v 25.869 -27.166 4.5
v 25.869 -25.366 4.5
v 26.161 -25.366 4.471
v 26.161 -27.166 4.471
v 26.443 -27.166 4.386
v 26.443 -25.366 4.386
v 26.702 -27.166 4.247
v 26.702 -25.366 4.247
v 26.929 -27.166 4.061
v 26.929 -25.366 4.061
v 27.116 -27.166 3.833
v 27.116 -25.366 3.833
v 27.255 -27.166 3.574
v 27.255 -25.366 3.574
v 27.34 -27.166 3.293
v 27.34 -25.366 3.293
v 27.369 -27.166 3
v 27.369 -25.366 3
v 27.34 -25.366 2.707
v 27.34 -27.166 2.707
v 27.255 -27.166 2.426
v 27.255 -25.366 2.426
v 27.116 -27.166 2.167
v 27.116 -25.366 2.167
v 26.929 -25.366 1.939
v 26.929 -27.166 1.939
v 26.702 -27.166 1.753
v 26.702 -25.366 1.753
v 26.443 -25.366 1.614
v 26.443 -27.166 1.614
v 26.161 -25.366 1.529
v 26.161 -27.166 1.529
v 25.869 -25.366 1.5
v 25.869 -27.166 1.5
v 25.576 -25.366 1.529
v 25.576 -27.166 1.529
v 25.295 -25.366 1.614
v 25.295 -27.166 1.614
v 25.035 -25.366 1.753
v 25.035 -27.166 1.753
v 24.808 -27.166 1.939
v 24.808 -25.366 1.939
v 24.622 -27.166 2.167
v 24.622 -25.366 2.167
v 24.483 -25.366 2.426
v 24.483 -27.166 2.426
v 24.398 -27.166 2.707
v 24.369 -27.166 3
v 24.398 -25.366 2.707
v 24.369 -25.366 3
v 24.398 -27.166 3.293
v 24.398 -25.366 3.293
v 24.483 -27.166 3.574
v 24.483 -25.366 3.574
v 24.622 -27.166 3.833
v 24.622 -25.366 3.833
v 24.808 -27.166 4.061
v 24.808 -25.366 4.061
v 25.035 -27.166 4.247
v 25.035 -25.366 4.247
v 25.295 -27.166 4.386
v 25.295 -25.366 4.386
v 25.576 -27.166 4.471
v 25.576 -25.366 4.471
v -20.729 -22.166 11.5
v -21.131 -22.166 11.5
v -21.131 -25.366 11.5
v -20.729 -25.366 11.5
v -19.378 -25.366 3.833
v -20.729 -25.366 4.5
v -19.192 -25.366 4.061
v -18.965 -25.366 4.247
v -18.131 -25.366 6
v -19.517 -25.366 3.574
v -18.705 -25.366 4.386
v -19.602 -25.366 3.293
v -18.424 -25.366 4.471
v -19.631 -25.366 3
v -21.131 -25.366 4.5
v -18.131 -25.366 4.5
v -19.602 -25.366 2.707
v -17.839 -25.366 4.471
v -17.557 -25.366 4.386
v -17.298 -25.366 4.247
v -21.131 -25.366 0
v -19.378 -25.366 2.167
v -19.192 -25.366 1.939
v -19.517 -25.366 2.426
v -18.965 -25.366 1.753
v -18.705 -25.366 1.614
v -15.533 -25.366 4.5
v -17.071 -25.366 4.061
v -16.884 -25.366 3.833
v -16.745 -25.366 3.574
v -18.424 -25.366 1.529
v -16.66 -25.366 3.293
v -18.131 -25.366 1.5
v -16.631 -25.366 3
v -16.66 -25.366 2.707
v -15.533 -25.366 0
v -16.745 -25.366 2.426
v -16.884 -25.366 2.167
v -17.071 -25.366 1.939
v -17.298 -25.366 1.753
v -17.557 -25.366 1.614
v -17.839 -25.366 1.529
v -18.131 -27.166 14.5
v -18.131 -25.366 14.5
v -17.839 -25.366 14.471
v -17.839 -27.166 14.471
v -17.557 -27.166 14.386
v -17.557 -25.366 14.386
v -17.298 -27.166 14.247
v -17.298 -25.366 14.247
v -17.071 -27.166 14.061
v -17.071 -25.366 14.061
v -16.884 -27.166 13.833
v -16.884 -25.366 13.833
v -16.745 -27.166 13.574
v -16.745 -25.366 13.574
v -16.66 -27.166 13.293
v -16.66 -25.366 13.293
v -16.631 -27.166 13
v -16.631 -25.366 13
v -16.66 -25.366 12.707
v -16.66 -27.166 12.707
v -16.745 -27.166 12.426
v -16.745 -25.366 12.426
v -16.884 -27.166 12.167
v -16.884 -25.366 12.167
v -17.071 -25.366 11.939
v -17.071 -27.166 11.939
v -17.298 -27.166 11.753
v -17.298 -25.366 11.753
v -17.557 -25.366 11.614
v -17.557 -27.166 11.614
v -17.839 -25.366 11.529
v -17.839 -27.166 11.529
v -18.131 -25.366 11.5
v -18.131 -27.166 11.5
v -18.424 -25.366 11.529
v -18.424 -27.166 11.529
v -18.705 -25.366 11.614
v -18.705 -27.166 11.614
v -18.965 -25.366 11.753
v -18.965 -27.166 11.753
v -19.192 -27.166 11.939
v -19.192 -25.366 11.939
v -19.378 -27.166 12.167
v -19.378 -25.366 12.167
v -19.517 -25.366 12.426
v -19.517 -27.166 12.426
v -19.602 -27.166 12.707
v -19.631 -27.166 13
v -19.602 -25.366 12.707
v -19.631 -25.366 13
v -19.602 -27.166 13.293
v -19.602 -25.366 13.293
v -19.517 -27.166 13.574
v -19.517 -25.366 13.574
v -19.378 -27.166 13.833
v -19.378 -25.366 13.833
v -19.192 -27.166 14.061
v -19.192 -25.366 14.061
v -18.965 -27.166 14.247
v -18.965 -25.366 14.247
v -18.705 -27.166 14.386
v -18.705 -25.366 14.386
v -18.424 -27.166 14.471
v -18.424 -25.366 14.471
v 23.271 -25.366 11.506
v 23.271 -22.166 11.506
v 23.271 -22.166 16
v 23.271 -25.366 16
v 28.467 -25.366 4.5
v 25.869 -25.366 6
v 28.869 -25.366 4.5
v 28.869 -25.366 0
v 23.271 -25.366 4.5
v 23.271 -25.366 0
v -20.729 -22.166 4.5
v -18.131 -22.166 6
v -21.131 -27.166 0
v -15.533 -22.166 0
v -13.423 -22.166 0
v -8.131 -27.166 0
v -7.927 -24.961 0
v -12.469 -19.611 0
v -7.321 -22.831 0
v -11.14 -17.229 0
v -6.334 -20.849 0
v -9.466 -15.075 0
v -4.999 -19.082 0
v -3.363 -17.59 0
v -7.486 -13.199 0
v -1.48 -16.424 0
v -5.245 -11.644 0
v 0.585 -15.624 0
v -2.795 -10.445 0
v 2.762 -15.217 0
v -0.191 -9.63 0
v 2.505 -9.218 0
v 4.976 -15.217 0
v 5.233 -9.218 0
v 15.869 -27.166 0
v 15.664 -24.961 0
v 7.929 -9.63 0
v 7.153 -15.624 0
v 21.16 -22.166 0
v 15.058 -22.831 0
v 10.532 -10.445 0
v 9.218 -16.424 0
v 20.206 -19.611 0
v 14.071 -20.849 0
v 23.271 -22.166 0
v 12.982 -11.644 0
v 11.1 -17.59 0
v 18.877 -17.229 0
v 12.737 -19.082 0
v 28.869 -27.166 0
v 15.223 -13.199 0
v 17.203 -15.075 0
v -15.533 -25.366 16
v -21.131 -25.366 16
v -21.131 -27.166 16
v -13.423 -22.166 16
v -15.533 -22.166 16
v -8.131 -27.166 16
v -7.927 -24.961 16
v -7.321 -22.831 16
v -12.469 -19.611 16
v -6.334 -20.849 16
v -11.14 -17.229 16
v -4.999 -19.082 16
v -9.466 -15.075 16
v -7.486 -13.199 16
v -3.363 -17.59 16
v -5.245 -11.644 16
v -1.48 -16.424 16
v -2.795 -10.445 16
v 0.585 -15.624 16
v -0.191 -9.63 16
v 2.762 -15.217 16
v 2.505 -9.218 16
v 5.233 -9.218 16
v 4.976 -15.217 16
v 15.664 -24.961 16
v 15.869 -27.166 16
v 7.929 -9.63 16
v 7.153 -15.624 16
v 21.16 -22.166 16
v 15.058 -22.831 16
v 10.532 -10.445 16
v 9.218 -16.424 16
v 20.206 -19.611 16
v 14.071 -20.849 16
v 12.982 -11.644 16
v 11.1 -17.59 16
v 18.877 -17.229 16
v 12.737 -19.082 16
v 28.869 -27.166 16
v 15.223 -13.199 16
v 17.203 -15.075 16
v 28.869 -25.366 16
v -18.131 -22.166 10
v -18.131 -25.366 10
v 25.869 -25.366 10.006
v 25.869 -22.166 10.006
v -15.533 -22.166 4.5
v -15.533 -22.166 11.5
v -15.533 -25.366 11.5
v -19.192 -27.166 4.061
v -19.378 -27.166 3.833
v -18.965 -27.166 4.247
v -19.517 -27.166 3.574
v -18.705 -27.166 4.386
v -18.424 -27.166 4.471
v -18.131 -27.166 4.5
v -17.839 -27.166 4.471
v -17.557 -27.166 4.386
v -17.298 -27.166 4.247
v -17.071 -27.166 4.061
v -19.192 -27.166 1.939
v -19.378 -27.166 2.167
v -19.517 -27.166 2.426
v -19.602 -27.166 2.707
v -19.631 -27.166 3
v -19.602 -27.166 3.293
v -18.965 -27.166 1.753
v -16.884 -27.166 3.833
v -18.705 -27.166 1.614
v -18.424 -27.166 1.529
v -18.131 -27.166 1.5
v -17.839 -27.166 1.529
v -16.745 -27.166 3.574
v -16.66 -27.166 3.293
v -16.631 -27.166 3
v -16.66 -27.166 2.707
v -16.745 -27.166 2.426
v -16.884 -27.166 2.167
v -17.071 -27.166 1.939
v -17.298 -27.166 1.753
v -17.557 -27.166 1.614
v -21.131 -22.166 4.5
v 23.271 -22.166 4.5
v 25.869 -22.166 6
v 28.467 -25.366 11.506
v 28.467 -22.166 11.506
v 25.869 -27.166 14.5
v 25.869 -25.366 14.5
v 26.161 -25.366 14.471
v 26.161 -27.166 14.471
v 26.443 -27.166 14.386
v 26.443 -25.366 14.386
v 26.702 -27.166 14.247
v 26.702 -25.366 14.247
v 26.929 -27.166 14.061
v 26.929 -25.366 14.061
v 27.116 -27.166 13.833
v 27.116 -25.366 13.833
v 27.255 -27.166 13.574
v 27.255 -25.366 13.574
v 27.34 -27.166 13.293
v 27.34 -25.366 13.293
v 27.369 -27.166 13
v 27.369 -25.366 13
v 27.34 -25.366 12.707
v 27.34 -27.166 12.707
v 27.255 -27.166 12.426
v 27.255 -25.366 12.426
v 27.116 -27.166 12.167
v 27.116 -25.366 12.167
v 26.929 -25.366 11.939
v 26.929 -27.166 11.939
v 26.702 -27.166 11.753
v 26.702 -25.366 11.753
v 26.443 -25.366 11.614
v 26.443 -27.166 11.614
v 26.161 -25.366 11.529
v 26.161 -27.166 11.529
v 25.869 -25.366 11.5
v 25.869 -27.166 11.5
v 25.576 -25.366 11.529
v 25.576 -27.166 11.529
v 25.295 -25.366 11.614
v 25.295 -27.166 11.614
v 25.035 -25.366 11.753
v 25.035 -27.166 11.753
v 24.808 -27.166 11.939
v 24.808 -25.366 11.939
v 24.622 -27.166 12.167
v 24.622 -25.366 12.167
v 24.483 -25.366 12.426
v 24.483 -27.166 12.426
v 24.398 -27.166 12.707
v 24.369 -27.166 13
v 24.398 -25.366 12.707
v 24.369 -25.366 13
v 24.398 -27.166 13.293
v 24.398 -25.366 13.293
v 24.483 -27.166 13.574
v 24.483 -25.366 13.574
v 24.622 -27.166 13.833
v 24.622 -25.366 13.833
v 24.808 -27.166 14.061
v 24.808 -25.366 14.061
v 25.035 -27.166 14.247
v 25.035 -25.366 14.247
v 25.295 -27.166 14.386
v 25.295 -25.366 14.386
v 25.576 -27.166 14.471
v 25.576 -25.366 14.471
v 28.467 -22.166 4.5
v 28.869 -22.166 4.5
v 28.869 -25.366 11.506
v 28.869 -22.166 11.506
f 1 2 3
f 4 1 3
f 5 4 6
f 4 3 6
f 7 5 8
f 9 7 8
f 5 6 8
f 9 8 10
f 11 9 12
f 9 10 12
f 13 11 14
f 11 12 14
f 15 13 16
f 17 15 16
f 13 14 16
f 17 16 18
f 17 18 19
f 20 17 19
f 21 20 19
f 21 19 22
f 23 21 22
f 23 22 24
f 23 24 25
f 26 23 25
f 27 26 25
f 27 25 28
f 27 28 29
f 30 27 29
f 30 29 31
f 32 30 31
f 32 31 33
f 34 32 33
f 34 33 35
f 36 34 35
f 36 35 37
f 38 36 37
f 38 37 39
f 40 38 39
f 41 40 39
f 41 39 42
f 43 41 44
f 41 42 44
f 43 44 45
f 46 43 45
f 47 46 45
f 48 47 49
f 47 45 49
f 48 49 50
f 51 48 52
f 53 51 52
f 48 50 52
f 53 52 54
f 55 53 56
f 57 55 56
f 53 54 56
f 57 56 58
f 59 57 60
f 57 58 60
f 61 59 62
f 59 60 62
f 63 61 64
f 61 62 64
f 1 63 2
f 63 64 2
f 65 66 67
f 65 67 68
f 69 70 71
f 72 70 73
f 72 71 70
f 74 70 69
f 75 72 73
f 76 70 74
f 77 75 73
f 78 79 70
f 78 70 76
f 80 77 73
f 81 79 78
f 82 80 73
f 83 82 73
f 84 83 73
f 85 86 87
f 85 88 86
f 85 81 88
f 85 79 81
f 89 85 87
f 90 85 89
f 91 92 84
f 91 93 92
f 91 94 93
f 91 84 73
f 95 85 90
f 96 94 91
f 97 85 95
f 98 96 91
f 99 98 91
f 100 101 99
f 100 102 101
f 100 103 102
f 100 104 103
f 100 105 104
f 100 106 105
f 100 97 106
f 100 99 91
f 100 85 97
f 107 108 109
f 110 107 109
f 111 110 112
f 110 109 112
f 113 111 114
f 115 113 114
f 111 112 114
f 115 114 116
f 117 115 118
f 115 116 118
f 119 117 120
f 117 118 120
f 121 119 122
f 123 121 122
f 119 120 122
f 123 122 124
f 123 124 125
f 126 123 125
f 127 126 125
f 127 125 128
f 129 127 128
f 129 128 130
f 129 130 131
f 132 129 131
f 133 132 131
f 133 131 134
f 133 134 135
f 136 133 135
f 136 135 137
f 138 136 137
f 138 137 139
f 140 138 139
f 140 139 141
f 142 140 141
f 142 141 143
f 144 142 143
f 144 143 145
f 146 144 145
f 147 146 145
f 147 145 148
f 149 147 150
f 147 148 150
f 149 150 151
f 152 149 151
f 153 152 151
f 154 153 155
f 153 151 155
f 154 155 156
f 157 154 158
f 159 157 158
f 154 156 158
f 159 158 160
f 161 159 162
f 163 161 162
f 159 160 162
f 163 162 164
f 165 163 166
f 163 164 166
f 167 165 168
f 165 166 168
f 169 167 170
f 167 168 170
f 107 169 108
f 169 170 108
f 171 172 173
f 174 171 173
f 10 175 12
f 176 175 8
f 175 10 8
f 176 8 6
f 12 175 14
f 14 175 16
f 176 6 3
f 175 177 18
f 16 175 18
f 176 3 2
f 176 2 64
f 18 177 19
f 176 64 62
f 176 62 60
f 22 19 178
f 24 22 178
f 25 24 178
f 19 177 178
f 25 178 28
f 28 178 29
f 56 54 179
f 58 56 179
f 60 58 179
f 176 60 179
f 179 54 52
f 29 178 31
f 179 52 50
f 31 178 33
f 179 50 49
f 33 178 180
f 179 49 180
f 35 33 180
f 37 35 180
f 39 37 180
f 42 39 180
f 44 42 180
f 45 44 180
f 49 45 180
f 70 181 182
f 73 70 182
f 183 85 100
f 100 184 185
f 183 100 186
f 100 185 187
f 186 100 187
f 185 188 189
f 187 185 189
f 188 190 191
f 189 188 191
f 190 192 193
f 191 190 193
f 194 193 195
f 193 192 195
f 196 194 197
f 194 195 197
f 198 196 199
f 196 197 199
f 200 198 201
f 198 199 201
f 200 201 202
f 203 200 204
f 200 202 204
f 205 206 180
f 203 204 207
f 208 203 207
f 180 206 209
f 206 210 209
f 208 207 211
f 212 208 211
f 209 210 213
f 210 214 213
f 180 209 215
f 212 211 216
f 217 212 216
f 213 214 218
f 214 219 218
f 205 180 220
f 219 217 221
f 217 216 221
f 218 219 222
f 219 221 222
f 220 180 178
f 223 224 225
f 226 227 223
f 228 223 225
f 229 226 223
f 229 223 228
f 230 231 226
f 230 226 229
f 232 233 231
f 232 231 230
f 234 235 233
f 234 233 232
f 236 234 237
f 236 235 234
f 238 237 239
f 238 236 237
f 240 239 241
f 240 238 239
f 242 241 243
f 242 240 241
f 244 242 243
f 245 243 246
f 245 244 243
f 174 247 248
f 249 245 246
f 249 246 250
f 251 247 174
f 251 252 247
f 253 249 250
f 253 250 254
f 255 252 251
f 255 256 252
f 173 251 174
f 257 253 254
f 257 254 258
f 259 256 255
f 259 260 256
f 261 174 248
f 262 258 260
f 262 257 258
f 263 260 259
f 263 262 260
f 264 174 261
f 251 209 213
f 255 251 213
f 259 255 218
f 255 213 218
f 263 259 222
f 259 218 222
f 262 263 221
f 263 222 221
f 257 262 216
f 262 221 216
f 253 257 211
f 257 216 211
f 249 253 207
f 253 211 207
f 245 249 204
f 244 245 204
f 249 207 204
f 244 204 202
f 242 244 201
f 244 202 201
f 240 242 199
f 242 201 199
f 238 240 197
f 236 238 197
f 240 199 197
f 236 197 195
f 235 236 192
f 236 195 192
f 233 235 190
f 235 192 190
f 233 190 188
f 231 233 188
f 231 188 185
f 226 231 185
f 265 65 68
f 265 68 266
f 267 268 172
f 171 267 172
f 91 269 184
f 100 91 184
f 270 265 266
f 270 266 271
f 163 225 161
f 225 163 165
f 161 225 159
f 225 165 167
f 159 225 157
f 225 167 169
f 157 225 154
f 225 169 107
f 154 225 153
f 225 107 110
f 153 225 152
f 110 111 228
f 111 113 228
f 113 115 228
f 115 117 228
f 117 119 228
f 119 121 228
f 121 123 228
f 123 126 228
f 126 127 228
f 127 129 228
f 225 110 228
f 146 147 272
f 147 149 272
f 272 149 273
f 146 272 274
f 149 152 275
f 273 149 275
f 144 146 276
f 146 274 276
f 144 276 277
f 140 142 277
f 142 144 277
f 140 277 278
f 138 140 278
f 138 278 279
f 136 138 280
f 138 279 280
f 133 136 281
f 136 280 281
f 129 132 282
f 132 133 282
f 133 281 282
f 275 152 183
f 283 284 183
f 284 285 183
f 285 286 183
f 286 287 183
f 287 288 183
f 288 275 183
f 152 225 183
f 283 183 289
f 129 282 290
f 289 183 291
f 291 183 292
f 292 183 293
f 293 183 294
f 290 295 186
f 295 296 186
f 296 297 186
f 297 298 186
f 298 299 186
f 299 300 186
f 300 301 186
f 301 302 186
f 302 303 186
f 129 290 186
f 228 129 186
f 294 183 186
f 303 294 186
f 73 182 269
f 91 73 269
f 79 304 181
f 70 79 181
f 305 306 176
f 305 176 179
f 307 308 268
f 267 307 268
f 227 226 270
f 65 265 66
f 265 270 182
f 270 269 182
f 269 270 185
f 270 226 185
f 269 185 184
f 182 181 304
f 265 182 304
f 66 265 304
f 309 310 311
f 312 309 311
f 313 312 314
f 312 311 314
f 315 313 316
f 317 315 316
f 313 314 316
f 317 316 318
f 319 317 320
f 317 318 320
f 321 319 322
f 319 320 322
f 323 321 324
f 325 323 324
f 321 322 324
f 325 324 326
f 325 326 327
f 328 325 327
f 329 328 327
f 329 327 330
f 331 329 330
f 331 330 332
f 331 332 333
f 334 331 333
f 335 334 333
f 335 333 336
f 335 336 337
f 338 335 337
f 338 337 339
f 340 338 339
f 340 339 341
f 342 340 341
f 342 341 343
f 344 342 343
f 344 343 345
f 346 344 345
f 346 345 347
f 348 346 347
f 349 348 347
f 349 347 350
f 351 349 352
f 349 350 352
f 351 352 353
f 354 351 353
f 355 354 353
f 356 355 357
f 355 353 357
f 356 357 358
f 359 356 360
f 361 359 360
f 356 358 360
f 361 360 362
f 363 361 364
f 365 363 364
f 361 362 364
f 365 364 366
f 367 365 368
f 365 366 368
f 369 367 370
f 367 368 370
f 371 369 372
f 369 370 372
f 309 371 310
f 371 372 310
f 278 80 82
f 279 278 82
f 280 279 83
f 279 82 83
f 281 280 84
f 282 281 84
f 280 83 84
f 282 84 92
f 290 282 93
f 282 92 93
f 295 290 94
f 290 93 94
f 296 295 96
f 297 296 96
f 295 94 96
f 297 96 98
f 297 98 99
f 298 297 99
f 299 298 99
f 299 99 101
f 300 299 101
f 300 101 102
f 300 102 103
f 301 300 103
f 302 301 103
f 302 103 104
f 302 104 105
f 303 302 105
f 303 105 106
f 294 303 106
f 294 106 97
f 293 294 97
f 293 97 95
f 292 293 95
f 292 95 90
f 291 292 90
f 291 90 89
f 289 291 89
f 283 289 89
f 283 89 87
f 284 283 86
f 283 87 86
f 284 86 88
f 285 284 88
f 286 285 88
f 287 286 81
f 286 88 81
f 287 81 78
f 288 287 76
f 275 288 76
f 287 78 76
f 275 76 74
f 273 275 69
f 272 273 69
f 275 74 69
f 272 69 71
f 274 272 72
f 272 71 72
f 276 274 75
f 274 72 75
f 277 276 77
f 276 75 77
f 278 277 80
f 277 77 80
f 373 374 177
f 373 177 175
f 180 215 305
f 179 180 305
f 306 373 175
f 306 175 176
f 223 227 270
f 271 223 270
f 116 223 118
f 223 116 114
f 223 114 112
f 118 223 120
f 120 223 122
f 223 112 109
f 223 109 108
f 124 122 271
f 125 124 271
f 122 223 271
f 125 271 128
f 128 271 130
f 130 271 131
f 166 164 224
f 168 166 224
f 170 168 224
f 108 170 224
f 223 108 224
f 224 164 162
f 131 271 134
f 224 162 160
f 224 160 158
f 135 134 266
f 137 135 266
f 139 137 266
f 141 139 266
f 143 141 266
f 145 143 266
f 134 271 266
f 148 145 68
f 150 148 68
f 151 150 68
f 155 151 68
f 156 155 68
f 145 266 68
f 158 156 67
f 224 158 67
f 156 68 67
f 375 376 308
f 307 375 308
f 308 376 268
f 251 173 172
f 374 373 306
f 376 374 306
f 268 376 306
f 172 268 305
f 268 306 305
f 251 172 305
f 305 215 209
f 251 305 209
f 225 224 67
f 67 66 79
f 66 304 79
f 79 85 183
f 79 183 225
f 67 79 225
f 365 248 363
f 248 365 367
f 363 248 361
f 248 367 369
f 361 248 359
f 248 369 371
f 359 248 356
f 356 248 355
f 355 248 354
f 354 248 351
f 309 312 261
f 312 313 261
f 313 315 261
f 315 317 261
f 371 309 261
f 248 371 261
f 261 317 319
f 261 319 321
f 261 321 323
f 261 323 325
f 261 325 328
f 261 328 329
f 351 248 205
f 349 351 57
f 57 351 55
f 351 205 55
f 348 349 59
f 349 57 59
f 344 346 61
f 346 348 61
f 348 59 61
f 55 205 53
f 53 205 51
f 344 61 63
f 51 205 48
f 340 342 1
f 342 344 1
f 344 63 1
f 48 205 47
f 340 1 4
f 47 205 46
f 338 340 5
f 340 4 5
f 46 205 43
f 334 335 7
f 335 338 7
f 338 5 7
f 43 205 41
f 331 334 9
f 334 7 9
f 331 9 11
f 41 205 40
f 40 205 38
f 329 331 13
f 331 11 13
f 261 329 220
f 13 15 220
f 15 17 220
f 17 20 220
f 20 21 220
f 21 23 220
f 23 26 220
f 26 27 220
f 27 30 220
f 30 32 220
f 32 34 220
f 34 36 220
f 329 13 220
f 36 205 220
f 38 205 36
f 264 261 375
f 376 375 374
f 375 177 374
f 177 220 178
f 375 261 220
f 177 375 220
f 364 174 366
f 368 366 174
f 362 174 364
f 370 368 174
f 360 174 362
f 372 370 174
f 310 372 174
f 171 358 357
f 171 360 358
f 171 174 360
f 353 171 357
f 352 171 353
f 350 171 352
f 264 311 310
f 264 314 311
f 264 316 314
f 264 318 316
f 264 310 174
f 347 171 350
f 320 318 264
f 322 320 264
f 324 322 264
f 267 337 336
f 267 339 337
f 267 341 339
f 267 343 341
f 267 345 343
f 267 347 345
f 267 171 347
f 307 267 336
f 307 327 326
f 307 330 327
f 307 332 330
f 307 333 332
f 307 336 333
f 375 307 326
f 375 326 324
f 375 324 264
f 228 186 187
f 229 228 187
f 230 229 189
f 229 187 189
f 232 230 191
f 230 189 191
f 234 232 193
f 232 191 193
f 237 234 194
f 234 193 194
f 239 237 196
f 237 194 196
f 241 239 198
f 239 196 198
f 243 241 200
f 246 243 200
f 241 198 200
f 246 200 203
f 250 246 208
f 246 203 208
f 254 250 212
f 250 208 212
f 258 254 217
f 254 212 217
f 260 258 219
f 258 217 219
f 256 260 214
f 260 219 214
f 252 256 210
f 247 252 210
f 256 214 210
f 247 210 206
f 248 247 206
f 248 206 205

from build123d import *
from OCP.BRepAlgoAPI import BRepAlgoAPI_Cut
from OCP.TopTools import TopTools_ListOfShape

# Parameters (mm, degrees)
BOSS_EXTRUDE1_DEPTH = 16
CUT_EXTRUDE12_START = -22.166013
CUT_EXTRUDE12_DEPTH = 3.2
SKETCH14_R          = 1.5
CUT_EXTRUDE13_DEPTH = 50


with BuildPart() as part:
    # Sketch7 → Boss-Extrude1 (new body)
    with BuildSketch(Plane.XY):
        with BuildLine():
            Line((28.868798372, -27.16601268), (28.868798372, -22.16601268))
            Line((28.868798372, -22.16601268), (21.160414837, -22.16601268))
            ThreePointArc((21.160414837, -22.16601268), (3.868798372, -9.16601268), (-13.422818094, -22.16601268))
            Line((-13.422818094, -22.16601268), (-21.131201628, -22.16601268))
            Line((-21.131201628, -22.16601268), (-21.131201628, -27.16601268))
            Line((-21.131201628, -27.16601268), (-8.131201628, -27.16601268))
            ThreePointArc((-8.131201628, -27.16601268), (3.868798372, -15.16601268), (15.868798372, -27.16601268))
            Line((15.868798372, -27.16601268), (28.868798372, -27.16601268))
        make_face()
    extrude(amount=BOSS_EXTRUDE1_DEPTH)


with BuildPart() as cut_extrude12_tool:
    # Sketch13 → Cut-Extrude12 (new body)
    with BuildSketch(Plane(origin=(0, 0, 0), x_dir=(1, 0, 0), z_dir=(0, 1, 0)).offset(CUT_EXTRUDE12_START)):
        Polygon((-15.533125417, -4.5), (-15.533125417, -1.5), (-15.533125417, 0), (-18.131201628, 0), (-20.72927784, 0), (-21.131201628, 0), (-21.131201628, -4.5), (-20.72927784, -4.5), (-18.131201628, -6), align=None)
        Polygon((-21.131201628, -11.5), (-20.72927784, -11.5), (-18.131201628, -10), (-15.533125417, -11.5), (-15.533125417, -11.544775658), (-15.533125417, -16), (-18.131201628, -16), (-20.72927784, -16), (-21.131201628, -16), align=None)
        Polygon((23.27072216, -4.5), (23.27072216, -1.5), (23.27072216, 0), (25.868798372, 0), (28.466874583, 0), (28.868798372, 0), (28.868798372, -4.5), (28.466874583, -4.5), (25.868798372, -6), align=None)
        Polygon((28.466874583, -11.506491479), (25.868798372, -10.006491479), (23.27072216, -11.506491479), (23.27072216, -14.506491479), (23.27072216, -16.006491479), (25.868798372, -16.006491479), (28.466874583, -16.006491479), (28.868798372, -16.006491479), (28.868798372, -11.506491479), align=None)
    extrude(amount=-CUT_EXTRUDE12_DEPTH)


with BuildPart() as part_1:
    add(part.part)

    # Cut-Extrude12: cut by cut_extrude12_tool, with a tolerance
    cut_extrude12_stock = TopTools_ListOfShape()
    cut_extrude12_stock.Append(part_1.part.wrapped)
    cut_extrude12_tools = TopTools_ListOfShape()
    cut_extrude12_tools.Append(cut_extrude12_tool.part.wrapped)
    cut_extrude12_cut = BRepAlgoAPI_Cut()
    cut_extrude12_cut.SetArguments(cut_extrude12_stock)
    cut_extrude12_cut.SetTools(cut_extrude12_tools)
    cut_extrude12_cut.SetFuzzyValue(0.00001)
    cut_extrude12_cut.Build()
    add(Compound.cast(cut_extrude12_cut.Shape()).solids(), mode=Mode.REPLACE)

    # Sketch14 → Cut-Extrude13 (cut)
    with BuildSketch(Plane(origin=(0, 0, 0), x_dir=(1, 0, 0), z_dir=(0, 1, 0))):
        with Locations(Location((-18.131201628, -3, 0), (0, 0, 270))):
            Circle(SKETCH14_R)
        with Locations(Location((-18.131201628, -13, 0), (0, 0, 270))):
            Circle(SKETCH14_R)
        with Locations(Location((25.868798372, -3, 0), (0, 0, 270))):
            Circle(SKETCH14_R)
        with Locations(Location((25.868798372, -13, 0), (0, 0, 270))):
            Circle(SKETCH14_R)
    extrude(amount=-CUT_EXTRUDE13_DEPTH, mode=Mode.SUBTRACT)


solid = part_1.part
